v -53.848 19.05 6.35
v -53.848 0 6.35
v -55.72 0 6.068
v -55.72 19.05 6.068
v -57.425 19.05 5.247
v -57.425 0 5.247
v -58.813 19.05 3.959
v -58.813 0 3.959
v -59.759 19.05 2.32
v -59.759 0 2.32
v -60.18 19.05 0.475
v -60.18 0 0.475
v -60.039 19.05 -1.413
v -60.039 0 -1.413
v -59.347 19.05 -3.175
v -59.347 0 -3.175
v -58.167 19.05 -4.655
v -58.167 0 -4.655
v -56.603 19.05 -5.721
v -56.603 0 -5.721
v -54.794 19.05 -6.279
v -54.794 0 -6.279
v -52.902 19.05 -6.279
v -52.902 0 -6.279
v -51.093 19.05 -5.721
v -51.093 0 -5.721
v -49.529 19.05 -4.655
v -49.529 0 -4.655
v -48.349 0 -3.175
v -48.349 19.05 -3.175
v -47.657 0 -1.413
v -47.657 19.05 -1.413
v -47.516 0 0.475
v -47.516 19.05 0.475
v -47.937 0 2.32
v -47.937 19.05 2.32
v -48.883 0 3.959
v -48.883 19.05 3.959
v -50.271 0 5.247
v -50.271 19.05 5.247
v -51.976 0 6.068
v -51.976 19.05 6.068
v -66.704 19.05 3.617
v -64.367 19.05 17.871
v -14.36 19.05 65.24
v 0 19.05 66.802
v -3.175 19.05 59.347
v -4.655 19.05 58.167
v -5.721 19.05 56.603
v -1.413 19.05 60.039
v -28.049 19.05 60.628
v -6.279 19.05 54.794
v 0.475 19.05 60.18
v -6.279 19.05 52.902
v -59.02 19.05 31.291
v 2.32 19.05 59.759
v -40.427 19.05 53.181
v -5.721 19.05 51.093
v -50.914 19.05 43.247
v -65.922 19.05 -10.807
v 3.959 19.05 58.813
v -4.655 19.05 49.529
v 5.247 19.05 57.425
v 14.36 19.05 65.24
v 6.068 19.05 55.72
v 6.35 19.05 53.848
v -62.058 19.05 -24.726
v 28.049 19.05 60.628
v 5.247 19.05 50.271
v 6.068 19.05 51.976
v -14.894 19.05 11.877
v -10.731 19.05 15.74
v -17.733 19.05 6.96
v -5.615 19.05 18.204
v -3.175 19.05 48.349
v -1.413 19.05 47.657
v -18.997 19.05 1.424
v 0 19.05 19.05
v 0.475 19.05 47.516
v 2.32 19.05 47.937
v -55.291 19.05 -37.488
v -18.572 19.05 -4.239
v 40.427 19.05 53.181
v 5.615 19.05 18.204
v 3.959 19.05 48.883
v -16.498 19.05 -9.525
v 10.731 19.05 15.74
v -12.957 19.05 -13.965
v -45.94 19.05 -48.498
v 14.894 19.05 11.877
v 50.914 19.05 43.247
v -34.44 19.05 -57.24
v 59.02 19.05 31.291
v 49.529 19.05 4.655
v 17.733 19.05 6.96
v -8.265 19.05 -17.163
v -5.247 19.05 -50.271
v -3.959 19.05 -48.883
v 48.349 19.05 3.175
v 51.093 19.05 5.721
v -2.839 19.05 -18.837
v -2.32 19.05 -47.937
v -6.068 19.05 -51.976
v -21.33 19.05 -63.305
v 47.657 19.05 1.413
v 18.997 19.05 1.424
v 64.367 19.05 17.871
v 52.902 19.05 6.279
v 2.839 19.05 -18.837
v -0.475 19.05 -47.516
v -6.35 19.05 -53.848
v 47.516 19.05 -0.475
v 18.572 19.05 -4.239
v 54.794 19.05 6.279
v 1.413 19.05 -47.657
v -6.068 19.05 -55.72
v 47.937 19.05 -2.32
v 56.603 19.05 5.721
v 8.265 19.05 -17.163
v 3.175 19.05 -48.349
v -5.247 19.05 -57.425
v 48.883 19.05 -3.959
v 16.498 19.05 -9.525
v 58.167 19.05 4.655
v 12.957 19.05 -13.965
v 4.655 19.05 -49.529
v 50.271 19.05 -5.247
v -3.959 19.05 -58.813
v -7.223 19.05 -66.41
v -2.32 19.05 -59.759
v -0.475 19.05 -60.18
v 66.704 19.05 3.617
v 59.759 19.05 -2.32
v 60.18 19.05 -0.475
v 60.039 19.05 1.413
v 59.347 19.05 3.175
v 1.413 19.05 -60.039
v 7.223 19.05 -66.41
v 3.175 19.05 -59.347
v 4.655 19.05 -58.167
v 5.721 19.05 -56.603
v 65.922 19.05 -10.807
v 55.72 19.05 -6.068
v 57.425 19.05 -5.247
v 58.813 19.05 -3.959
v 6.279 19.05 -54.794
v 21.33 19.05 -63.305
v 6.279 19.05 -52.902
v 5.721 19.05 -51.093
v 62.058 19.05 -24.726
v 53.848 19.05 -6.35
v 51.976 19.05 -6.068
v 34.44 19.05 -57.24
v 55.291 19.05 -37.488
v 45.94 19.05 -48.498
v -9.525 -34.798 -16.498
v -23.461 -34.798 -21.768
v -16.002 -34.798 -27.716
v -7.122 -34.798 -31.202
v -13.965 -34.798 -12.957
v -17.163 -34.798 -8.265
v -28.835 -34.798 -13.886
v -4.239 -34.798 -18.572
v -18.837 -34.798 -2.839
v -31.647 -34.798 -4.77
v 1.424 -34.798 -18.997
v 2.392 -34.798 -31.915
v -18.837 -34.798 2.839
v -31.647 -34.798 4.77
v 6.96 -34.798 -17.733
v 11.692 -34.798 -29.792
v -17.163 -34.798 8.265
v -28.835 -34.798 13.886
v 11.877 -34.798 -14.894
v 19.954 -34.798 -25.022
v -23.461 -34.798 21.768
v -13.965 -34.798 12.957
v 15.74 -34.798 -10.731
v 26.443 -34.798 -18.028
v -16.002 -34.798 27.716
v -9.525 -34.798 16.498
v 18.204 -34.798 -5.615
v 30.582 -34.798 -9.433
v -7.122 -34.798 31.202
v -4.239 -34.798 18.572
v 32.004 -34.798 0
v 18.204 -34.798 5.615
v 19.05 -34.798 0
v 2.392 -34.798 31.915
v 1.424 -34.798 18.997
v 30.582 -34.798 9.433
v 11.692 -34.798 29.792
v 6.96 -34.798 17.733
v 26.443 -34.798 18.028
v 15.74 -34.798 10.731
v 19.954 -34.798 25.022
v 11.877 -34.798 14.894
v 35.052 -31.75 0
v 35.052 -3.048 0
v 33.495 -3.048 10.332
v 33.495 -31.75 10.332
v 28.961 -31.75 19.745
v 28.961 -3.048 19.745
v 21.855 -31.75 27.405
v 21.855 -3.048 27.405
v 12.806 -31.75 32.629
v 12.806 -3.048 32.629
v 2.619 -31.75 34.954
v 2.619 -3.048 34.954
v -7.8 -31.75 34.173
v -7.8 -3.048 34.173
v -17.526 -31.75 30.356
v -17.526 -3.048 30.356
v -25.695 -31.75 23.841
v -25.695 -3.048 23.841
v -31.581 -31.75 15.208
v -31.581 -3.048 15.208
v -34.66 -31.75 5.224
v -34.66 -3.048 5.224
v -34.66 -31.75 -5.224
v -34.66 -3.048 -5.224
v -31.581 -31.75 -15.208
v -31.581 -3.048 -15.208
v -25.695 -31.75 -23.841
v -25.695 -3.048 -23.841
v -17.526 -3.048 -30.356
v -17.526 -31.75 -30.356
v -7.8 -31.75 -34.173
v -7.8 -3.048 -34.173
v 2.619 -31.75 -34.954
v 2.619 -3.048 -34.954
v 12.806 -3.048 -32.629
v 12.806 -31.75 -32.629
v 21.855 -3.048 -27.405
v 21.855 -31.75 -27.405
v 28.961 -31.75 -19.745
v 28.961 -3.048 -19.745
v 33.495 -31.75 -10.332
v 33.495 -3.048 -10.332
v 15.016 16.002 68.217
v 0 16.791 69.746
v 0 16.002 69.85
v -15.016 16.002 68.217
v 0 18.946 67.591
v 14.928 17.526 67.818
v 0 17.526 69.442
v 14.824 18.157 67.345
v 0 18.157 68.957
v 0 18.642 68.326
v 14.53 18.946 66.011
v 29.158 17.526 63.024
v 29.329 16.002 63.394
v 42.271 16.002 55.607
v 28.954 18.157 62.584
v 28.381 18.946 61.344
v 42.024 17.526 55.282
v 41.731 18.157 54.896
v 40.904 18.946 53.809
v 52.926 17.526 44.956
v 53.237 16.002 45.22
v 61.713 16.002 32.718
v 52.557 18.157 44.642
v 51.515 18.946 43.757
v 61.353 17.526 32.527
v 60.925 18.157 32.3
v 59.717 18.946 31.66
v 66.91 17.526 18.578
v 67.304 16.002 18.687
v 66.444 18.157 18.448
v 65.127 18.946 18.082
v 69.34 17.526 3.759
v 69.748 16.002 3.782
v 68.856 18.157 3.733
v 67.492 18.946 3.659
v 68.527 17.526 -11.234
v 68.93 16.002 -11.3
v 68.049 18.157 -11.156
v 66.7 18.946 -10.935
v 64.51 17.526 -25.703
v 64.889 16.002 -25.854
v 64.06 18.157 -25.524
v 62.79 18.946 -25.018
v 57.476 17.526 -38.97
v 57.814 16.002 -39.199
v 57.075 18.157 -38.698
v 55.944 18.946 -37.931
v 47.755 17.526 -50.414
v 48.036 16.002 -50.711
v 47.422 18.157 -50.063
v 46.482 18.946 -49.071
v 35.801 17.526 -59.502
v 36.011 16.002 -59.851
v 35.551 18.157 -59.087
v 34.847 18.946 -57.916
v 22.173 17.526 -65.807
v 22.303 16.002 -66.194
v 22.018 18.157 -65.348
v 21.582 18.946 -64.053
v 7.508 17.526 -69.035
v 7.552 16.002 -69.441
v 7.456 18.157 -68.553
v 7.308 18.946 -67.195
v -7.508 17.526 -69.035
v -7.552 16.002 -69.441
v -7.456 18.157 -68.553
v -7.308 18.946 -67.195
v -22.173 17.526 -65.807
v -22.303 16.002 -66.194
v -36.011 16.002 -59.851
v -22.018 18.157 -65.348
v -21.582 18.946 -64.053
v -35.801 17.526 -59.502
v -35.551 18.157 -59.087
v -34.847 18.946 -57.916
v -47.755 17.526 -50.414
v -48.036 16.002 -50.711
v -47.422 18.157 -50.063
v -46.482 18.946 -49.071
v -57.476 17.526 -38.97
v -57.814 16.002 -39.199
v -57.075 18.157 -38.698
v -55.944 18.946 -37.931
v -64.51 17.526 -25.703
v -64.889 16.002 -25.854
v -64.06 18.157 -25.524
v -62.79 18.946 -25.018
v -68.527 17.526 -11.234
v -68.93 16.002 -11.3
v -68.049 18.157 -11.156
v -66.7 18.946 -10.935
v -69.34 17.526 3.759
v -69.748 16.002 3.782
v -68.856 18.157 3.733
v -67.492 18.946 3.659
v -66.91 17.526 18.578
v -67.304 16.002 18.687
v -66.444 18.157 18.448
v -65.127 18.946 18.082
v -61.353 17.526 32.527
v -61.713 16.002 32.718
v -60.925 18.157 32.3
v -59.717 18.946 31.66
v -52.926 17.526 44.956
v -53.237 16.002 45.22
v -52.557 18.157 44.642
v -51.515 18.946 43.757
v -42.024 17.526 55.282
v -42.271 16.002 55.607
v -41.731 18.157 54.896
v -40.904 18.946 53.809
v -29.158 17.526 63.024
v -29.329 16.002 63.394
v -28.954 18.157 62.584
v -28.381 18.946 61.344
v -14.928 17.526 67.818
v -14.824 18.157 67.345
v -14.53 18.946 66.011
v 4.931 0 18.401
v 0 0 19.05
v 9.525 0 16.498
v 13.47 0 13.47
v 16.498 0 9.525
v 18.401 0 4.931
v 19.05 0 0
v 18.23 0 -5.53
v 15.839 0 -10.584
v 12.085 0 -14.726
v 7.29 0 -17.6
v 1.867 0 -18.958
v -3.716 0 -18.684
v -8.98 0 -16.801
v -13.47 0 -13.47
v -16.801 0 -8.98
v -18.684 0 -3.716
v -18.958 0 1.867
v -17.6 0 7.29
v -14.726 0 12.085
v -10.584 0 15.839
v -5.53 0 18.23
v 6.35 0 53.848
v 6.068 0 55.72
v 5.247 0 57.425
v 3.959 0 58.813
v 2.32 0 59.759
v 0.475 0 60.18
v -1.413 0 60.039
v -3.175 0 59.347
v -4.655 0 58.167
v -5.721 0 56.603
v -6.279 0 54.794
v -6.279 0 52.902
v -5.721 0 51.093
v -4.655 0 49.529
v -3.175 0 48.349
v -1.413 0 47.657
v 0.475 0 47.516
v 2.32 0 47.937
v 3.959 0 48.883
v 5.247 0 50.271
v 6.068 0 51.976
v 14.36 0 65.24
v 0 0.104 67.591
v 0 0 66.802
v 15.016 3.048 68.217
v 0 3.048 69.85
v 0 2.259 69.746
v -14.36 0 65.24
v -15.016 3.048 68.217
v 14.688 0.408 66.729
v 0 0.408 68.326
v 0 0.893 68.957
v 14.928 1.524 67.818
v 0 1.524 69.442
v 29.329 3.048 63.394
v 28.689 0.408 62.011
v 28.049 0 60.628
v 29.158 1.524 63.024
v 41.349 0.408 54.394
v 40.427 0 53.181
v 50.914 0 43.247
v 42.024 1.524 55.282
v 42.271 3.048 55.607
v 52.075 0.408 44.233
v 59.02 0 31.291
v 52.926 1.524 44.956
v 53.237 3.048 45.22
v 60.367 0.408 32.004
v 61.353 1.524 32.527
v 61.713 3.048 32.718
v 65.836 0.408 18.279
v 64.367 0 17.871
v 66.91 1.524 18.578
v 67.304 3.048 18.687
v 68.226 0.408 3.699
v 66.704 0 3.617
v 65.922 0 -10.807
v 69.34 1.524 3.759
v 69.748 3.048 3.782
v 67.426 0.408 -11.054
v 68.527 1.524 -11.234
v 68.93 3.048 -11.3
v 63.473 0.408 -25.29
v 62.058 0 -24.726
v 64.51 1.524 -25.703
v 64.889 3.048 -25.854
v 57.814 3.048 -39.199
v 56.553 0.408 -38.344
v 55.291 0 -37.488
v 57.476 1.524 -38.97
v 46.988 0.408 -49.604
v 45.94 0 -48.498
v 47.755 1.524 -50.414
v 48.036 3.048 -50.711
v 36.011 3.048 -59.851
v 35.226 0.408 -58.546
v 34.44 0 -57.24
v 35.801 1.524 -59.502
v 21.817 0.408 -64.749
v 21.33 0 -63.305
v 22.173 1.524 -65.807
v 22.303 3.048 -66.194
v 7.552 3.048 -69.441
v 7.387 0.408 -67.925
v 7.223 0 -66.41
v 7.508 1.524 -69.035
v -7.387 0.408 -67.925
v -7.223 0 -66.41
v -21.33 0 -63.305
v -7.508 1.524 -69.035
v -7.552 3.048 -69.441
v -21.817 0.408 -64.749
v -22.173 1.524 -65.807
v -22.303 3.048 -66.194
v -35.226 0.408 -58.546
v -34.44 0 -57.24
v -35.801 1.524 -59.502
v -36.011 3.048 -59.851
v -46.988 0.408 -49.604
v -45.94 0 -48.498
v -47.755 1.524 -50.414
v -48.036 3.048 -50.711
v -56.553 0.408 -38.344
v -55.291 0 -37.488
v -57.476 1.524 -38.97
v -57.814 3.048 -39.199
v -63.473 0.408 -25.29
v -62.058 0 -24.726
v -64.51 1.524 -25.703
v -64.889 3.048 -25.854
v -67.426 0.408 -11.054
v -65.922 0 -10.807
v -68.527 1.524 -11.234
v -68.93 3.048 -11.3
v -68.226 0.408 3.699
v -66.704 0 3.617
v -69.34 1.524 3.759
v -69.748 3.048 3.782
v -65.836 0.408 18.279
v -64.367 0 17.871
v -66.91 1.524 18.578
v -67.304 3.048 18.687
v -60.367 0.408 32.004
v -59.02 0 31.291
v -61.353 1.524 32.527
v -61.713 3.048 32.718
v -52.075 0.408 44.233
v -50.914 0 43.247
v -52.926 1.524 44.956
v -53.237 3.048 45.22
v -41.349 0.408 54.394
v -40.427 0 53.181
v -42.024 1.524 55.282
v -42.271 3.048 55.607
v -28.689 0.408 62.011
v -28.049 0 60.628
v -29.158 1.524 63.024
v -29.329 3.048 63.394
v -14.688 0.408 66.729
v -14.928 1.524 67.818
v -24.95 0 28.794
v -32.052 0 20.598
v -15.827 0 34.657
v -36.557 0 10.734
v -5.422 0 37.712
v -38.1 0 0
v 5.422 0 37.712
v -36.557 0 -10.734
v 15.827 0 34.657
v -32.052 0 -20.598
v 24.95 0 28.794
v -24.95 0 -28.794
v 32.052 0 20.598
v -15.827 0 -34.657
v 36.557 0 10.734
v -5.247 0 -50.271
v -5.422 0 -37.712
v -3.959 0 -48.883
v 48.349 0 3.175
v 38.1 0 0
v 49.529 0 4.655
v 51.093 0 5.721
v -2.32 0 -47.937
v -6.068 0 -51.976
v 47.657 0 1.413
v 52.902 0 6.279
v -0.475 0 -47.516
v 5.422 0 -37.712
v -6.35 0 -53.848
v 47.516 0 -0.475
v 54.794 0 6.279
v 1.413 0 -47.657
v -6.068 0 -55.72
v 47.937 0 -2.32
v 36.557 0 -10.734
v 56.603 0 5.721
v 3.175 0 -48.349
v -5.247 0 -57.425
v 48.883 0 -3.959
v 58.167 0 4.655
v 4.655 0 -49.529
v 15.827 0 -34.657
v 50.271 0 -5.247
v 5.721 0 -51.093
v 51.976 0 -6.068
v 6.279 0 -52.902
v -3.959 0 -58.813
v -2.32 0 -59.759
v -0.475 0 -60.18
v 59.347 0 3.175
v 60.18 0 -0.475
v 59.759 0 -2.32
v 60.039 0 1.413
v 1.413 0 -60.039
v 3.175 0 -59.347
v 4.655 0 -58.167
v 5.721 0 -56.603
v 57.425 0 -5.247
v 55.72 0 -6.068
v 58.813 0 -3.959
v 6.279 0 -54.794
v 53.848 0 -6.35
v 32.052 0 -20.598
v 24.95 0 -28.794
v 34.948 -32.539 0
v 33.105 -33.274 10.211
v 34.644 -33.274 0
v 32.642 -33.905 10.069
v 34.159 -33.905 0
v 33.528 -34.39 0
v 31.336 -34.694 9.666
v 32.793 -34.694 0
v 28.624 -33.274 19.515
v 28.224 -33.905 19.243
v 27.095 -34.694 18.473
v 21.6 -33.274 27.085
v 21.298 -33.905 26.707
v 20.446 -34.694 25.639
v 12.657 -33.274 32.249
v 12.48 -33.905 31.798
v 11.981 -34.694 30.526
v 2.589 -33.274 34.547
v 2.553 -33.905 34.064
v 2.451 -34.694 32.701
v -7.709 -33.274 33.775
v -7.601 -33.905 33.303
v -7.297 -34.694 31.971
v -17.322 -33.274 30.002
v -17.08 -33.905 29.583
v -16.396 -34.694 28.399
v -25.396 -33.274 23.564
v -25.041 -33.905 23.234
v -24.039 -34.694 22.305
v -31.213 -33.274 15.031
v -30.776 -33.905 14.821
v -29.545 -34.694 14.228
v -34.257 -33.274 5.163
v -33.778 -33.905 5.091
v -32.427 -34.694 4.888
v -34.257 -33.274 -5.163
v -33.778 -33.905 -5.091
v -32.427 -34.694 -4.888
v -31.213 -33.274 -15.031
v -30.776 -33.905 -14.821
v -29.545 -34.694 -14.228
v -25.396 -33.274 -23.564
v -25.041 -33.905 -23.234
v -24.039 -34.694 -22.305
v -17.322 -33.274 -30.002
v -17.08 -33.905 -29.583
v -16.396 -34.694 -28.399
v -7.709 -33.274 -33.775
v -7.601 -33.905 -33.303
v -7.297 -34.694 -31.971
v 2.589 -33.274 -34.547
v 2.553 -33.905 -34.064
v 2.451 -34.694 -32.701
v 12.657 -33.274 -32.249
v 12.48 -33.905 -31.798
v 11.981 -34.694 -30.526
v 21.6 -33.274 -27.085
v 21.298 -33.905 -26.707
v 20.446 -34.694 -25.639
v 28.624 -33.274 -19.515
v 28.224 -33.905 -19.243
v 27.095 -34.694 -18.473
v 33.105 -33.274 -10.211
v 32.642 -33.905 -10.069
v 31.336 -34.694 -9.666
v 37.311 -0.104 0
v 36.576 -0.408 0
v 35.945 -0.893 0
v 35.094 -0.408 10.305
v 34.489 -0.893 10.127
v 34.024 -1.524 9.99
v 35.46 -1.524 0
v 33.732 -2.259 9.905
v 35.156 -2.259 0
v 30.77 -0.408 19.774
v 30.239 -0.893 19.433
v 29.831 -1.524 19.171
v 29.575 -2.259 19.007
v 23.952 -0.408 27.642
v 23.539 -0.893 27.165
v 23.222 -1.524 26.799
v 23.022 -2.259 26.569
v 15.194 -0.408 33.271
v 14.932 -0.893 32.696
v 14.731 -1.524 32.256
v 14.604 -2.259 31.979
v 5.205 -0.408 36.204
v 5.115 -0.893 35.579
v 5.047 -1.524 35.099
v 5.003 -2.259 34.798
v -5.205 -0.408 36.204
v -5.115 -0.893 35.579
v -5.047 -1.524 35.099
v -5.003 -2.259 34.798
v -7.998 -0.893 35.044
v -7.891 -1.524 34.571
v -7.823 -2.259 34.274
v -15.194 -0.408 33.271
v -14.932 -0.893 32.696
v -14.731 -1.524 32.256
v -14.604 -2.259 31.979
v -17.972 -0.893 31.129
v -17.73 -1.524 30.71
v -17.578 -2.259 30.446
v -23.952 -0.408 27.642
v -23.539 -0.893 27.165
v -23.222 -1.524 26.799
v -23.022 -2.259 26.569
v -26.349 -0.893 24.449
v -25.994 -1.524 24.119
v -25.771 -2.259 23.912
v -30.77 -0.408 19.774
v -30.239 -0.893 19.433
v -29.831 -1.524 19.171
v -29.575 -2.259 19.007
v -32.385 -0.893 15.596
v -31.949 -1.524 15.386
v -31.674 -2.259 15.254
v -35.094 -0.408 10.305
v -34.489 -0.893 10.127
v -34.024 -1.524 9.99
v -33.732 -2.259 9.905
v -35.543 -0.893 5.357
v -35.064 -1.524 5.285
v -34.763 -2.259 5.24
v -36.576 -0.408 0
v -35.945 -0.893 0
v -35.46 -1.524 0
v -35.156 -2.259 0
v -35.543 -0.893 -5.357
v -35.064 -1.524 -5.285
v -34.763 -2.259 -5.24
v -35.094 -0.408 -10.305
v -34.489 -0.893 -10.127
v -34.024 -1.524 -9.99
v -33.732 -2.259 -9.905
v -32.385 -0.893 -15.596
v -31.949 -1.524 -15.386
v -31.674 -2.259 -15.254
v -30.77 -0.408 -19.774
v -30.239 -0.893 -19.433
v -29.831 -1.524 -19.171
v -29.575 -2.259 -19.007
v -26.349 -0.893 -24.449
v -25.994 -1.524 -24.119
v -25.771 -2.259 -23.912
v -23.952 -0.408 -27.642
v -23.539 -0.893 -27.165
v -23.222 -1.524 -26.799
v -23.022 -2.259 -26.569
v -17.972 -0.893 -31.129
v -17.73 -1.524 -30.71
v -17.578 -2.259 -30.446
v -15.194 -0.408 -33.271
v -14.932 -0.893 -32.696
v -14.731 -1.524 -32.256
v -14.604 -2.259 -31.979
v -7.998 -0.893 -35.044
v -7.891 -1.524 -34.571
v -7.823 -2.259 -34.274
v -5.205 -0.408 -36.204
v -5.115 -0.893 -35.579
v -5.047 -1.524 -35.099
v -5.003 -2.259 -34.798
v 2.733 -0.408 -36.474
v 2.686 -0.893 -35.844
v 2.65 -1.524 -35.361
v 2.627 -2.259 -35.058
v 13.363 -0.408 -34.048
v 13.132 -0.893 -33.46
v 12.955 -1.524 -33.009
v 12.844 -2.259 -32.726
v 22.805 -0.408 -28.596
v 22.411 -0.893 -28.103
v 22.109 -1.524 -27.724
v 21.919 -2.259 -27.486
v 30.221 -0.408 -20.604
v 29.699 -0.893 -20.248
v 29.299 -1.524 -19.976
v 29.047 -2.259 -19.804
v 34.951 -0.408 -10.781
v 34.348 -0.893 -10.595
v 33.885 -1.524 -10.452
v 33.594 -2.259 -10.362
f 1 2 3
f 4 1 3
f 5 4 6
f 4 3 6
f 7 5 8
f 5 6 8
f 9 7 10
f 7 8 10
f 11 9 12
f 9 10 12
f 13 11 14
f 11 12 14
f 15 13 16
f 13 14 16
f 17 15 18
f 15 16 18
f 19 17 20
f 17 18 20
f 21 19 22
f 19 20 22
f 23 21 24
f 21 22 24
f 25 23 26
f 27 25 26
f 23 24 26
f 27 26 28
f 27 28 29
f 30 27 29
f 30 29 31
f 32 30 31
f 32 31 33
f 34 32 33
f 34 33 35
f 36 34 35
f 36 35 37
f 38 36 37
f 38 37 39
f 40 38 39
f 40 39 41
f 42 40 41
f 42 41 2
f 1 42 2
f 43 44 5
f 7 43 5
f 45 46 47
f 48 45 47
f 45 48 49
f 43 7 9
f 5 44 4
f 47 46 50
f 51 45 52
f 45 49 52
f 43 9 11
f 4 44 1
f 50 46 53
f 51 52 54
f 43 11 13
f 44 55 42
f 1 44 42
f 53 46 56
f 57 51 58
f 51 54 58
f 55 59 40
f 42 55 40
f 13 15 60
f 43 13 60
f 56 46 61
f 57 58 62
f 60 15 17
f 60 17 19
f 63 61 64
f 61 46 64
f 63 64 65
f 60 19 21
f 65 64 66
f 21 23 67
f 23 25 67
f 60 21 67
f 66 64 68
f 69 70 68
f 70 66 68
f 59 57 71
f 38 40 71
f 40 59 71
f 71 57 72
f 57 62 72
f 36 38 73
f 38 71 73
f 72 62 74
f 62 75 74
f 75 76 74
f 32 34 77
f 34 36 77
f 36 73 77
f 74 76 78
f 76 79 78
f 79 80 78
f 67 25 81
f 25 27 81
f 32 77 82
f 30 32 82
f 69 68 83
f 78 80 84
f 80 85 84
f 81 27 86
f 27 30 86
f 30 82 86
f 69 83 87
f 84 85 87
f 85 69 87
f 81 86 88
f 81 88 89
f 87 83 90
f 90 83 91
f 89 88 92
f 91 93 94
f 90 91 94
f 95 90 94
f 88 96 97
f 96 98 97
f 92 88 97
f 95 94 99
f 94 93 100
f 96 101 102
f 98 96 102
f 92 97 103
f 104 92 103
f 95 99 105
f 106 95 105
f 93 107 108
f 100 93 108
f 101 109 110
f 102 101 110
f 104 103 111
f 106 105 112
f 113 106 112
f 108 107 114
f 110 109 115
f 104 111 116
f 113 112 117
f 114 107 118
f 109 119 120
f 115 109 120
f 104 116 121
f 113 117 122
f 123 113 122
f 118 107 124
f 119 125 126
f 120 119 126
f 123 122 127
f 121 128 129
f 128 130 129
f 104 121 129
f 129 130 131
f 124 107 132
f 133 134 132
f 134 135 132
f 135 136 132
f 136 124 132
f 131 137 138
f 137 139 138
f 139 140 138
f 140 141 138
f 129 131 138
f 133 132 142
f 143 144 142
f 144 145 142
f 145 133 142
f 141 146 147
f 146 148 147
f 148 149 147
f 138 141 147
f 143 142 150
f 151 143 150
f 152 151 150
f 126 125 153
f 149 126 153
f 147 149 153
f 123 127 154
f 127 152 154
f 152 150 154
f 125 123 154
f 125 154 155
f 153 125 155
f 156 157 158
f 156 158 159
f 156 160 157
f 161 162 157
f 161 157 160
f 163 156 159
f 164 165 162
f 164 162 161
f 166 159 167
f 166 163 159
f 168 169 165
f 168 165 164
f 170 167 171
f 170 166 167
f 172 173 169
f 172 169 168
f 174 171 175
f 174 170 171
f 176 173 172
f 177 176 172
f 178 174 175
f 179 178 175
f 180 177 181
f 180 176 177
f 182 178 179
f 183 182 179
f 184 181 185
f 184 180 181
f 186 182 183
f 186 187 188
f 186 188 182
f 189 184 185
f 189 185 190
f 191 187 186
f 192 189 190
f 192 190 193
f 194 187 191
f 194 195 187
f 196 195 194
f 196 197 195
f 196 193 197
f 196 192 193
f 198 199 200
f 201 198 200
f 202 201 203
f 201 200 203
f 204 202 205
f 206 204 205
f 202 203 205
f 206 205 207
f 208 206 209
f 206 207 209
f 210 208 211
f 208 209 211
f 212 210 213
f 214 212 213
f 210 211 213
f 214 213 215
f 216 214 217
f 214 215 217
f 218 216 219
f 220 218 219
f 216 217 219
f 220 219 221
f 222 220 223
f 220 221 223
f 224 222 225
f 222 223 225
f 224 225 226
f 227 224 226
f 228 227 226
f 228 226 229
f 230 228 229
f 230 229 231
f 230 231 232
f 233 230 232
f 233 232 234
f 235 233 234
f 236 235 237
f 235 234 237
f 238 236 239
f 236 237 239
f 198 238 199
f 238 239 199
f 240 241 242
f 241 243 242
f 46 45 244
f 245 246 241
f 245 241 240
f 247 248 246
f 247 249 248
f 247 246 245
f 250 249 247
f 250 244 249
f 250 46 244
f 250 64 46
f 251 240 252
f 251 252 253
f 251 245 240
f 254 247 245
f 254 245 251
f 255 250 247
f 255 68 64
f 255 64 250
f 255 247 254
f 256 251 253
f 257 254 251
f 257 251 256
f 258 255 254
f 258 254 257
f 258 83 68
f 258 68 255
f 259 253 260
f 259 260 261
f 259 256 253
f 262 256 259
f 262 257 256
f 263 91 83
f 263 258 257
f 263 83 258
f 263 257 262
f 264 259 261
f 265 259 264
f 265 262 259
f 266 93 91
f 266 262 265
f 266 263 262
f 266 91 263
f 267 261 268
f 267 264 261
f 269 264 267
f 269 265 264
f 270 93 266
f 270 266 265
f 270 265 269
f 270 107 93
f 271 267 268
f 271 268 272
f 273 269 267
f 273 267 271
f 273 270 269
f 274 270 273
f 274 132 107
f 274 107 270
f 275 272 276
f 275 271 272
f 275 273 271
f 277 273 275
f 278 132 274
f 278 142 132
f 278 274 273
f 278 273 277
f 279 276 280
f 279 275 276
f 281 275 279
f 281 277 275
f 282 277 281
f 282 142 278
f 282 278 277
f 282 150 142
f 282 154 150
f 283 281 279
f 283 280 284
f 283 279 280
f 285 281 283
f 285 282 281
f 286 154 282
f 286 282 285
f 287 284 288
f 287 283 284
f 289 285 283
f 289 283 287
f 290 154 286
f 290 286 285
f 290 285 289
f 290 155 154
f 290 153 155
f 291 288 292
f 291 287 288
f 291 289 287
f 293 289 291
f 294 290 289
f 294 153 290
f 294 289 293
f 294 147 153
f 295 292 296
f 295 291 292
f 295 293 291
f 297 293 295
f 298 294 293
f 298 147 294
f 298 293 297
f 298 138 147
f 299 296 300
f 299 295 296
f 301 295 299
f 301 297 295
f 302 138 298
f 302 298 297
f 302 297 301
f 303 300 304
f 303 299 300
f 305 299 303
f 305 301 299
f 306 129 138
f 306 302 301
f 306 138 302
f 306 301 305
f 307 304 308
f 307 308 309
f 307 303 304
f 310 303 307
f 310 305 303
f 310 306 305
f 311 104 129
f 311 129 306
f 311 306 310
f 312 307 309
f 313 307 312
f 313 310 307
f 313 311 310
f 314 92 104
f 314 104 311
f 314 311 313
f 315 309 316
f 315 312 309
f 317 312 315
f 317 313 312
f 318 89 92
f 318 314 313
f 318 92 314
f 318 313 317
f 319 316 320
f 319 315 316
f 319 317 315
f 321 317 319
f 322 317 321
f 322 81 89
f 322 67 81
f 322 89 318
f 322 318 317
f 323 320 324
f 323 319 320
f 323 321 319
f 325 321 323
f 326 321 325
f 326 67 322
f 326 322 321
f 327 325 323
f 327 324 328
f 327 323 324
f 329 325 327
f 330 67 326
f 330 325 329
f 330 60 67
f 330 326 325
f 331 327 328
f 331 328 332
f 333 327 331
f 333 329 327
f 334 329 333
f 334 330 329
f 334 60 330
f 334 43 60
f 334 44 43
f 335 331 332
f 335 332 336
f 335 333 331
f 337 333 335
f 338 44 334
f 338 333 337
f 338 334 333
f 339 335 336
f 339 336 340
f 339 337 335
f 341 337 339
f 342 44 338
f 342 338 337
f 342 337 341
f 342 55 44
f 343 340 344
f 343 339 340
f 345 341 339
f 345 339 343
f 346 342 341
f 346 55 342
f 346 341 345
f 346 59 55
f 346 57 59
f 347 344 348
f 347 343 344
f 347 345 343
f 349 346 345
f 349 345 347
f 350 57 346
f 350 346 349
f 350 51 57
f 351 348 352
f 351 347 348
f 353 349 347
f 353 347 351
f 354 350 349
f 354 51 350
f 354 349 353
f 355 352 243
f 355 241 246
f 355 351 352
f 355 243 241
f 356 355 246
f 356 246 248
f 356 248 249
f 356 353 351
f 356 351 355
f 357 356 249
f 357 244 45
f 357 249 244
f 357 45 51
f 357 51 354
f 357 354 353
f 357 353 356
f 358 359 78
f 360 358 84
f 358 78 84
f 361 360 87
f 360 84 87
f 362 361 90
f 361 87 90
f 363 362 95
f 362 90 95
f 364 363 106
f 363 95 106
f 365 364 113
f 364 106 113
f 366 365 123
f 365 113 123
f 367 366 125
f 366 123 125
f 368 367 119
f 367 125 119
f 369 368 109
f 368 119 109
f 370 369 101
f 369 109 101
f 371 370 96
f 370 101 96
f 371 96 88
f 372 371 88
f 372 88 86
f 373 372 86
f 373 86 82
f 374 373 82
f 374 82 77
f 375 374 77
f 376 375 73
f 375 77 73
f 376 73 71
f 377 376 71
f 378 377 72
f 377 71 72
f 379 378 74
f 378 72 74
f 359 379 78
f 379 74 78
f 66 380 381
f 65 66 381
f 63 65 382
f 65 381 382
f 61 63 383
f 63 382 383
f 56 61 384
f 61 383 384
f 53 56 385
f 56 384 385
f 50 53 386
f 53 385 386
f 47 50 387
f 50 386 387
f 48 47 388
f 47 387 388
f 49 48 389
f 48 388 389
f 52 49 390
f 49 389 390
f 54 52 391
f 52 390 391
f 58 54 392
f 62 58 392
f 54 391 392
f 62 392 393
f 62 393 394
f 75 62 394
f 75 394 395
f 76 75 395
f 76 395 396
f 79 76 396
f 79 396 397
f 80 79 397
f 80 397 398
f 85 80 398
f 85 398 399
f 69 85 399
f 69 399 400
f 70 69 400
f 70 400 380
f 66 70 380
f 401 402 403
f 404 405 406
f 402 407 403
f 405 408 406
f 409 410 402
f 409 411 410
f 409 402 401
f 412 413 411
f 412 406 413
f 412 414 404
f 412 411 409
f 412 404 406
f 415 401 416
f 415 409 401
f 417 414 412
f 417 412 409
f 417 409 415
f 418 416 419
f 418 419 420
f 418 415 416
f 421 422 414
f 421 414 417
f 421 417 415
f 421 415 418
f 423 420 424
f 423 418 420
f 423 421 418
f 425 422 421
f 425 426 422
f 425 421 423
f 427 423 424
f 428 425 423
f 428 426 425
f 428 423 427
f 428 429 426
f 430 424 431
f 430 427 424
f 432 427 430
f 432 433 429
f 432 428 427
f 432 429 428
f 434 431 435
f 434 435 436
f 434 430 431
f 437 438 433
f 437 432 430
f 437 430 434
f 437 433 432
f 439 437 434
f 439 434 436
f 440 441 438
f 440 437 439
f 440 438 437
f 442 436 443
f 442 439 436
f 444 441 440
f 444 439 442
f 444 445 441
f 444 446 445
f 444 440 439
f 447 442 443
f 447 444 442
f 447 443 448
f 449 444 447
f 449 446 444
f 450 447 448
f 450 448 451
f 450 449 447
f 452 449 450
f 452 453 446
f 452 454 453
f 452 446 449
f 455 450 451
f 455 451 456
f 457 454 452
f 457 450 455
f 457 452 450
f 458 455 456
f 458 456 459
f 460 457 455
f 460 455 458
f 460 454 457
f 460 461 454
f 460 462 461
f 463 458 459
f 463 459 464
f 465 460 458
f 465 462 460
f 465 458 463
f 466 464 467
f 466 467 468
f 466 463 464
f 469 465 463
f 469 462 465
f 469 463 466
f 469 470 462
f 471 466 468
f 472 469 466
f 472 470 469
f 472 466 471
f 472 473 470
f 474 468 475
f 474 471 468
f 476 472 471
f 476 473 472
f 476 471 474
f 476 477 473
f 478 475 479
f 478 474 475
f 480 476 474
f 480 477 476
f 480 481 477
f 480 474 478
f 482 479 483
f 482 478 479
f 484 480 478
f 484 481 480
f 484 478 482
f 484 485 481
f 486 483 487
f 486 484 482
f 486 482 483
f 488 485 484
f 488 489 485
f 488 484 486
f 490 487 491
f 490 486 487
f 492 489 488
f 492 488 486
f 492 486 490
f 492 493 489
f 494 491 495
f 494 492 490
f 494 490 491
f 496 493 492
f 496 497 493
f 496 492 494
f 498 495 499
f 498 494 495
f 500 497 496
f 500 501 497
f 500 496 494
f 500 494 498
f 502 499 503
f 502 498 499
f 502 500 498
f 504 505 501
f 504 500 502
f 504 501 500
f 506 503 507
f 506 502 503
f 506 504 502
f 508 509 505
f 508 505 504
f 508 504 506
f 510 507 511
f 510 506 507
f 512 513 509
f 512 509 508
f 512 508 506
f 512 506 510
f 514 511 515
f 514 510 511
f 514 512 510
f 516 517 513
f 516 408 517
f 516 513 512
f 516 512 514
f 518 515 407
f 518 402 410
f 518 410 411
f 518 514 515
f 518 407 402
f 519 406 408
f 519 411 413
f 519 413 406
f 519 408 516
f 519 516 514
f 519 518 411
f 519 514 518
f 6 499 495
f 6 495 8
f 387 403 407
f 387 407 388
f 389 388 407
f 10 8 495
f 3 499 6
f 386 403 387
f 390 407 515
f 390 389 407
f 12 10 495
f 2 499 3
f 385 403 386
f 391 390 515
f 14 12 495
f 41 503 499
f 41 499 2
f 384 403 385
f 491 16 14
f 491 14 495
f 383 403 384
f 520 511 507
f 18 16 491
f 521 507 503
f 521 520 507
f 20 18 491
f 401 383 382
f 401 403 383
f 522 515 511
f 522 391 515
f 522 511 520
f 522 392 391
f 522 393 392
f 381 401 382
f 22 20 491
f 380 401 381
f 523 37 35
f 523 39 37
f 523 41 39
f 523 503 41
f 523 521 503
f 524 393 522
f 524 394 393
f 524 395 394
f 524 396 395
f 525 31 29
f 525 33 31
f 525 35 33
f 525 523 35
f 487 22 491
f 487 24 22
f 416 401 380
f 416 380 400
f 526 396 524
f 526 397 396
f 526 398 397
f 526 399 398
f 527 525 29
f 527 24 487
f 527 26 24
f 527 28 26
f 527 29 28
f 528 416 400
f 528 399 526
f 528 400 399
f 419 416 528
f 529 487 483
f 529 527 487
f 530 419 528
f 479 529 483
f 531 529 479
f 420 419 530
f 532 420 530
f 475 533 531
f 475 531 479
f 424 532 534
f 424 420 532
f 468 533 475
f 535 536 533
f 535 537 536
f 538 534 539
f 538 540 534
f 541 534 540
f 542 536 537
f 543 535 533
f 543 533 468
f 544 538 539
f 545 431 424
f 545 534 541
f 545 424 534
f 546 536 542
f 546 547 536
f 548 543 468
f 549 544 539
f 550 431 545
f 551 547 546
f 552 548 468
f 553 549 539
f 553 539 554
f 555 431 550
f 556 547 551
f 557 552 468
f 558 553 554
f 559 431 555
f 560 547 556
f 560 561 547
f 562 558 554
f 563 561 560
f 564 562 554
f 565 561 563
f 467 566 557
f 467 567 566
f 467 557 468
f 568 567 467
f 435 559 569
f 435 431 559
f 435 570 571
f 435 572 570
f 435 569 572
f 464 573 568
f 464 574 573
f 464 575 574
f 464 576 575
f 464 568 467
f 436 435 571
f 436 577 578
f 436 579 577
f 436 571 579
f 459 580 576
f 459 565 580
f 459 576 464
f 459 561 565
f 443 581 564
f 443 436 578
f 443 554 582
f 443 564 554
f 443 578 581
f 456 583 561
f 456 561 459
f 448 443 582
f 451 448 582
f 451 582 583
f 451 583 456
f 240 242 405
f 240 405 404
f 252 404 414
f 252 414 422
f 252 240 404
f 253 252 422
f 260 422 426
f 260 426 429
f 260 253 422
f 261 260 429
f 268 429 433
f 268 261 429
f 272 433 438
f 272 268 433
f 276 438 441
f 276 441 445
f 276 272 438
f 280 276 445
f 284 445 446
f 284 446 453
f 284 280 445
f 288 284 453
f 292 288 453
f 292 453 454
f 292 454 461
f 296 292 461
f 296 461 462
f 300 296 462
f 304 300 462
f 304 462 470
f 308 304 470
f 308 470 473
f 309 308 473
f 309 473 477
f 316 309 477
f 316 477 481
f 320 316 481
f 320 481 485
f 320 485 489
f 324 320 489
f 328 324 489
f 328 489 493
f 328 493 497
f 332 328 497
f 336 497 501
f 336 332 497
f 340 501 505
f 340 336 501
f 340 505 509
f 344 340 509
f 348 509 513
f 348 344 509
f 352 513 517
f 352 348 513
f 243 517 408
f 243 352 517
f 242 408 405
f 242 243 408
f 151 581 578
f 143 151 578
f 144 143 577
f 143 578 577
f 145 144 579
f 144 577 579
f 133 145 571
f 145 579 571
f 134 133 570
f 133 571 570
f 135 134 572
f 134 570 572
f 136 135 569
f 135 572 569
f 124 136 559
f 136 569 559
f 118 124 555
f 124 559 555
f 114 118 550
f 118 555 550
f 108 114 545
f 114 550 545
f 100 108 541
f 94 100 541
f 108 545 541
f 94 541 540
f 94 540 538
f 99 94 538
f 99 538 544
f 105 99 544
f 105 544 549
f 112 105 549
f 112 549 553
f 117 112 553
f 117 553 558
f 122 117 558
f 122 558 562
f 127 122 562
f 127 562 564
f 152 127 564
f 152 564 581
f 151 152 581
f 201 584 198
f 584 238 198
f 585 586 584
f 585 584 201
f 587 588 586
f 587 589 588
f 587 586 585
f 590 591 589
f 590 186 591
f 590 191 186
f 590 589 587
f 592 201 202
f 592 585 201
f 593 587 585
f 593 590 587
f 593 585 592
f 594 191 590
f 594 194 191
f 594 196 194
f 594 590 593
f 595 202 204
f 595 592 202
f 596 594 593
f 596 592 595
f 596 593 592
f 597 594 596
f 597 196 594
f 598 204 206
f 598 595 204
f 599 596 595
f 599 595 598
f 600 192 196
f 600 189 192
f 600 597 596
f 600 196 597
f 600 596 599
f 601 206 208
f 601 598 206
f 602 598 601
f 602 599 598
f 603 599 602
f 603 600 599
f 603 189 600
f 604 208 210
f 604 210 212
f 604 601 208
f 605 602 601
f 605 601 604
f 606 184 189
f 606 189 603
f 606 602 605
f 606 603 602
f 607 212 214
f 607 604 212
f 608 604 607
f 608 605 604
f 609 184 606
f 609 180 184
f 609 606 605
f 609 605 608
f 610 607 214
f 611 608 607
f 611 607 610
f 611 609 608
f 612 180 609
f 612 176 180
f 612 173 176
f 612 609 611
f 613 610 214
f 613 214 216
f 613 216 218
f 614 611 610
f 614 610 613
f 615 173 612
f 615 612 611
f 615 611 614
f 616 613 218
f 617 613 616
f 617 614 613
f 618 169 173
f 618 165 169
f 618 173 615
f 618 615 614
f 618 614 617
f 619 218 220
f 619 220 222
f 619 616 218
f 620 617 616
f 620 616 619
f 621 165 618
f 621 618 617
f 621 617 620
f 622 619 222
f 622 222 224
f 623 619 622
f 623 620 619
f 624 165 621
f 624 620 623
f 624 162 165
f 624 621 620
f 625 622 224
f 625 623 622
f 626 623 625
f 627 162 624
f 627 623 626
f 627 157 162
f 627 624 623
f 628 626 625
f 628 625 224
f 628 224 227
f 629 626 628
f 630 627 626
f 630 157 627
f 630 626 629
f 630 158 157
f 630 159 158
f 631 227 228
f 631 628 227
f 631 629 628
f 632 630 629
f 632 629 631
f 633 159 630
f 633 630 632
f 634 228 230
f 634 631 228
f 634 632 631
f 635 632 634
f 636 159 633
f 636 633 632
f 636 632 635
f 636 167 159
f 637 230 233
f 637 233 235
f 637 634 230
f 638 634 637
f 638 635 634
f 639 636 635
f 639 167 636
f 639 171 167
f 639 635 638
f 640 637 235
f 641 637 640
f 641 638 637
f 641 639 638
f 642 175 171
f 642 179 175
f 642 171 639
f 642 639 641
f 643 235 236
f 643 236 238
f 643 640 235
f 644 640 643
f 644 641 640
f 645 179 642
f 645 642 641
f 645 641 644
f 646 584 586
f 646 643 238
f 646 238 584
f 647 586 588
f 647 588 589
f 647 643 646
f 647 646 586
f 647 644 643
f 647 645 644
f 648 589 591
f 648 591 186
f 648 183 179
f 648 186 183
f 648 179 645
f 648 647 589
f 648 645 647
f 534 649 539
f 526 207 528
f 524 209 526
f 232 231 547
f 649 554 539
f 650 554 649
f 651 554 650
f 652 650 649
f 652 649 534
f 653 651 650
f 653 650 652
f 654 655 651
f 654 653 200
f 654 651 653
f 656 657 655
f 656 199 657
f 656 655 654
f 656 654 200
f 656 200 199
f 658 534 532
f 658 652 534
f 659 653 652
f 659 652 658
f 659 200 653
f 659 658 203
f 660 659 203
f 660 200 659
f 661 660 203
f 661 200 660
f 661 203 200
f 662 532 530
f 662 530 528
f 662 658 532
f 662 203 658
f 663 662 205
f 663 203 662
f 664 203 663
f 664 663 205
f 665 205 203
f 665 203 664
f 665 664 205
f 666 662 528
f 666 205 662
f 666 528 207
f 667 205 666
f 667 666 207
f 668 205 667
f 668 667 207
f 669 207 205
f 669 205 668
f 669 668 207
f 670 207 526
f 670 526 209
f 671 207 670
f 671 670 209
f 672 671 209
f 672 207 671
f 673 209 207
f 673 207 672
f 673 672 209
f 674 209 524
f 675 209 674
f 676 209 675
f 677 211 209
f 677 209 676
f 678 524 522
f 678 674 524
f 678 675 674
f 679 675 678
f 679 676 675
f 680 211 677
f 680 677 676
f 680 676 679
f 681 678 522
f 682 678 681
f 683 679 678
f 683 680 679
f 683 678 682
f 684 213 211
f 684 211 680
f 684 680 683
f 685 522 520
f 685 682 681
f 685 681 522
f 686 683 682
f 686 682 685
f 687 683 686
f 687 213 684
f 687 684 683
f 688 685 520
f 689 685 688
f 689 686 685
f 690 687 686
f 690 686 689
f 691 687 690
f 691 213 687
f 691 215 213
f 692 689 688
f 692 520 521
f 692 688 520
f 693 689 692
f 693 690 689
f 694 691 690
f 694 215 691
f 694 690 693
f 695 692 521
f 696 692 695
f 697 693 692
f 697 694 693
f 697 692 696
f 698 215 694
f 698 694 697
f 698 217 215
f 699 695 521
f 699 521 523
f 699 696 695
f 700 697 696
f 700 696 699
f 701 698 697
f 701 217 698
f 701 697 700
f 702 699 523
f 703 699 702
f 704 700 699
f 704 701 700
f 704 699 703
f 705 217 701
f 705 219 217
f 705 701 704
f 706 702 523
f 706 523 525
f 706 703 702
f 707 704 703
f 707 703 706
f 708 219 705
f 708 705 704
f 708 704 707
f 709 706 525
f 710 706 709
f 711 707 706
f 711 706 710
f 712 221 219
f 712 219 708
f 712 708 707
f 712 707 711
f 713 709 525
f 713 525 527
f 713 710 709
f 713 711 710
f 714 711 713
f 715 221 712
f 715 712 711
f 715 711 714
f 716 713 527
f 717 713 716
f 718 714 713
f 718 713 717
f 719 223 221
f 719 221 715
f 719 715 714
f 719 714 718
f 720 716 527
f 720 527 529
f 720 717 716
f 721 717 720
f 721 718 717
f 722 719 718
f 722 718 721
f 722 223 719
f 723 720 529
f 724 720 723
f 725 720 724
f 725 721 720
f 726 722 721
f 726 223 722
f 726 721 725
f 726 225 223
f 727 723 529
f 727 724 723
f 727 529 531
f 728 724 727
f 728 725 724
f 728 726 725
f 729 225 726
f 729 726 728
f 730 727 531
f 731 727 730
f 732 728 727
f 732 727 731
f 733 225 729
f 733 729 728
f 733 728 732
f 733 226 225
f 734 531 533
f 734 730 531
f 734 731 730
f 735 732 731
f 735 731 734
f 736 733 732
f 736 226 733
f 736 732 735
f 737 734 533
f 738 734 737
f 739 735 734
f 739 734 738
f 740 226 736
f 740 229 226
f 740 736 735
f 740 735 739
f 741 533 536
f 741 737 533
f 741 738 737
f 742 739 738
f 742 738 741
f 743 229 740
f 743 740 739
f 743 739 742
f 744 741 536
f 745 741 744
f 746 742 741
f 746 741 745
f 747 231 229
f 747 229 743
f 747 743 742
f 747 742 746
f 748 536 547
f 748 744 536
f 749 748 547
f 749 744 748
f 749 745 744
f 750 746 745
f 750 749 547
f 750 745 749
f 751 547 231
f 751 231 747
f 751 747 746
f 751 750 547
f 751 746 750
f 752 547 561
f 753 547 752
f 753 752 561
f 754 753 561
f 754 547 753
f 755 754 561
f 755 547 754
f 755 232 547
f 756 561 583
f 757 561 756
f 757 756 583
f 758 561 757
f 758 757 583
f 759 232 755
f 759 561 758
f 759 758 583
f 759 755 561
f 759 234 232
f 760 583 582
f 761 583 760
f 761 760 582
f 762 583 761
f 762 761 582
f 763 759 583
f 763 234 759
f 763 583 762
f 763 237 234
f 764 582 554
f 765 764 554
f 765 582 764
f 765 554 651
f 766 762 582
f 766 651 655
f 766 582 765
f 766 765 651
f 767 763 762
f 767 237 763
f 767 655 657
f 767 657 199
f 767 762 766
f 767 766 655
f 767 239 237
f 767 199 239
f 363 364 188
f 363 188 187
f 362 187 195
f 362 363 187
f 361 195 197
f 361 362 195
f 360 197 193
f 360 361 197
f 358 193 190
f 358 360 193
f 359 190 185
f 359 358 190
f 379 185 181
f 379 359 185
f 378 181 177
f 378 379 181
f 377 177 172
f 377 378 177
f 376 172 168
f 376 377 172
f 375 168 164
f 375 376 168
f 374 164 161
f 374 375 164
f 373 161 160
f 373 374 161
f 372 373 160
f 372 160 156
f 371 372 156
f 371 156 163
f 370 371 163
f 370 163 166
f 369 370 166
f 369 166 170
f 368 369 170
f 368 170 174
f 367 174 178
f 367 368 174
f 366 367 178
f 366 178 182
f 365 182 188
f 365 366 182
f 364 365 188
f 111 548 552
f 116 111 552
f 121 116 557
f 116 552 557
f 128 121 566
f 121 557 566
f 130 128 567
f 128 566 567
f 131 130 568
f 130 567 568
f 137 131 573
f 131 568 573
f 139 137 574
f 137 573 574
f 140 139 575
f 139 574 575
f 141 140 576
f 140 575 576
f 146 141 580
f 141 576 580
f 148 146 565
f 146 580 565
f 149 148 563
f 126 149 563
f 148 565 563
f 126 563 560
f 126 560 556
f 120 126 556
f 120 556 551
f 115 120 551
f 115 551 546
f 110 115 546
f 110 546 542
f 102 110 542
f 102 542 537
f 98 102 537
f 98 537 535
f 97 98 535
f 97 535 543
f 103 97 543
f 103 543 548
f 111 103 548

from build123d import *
from build123d import SkipClean  # not in build123d's __all__

# Parameters (mm, degrees)
F0_W            = 19.05
F0_H            = 50.8
F2_R            = 35.052
F2_R_2          = 19.05
F3_DEPTH        = 34.798
F2_R_3          = 6.35
F4_DEPTH        = 19.051
F4_COPIES_COUNT = 4
F5_R            = 3.048
F6_R            = 3.048


# Not quite as in the source:
# - after a boolean that leaves OpenCascade's solid faulty, fix() repairs it
# - a pattern or mirror of a feature is missing from the dataset's text; its kind, count and spacing are read off the source's solid


with BuildPart() as f1:
    # F0 (on Right) → F1 (revolve)
    with BuildSketch(Plane.YZ):
        with Locations((9.525, 44.45)):
            Rectangle(F0_W, F0_H)
    revolve(axis=Axis((0, 24.8311646283, 0), (0, 1, 0)))

    # F2 (on face) → F3 (join)
    with BuildSketch(Plane.XZ):
        Circle(F2_R)
        Circle(F2_R_2, mode=Mode.SUBTRACT)
    with SkipClean():  # cleaning this boolean's faces spoils the solid; the shape is the same uncleaned
        extrude(amount=F3_DEPTH)

    # F2 (on face) → F4 (cut, through all)
    with BuildSketch(Plane.XZ):
        with Locations((0, 53.848)):
            Circle(F2_R_3)
    f4 = extrude(amount=-F4_DEPTH, mode=Mode.SUBTRACT)

    add(f1.part.fix(), mode=Mode.REPLACE)

    # F4_copies: F4 ×4 about axis
    f4_copies_axis = Axis((0, 0, 0), (0, 1, 0))
    for i in range(1, F4_COPIES_COUNT):
        add(f4.rotate(f4_copies_axis, i * 360 / F4_COPIES_COUNT), clean=False, mode=Mode.SUBTRACT)

    # F5
    f5_edges = [f1.edges().sort_by_distance(p)[0] for p in [
        (0, 0, -69.85),
        (0, 19.05, -69.85),
    ]]
    fillet(f5_edges, radius=F5_R)

    # F6
    f6_edges = [f1.edges().sort_by_distance(p)[0] for p in [
        (35.052, -17.399, 0),
        (-35.052, -34.798, 0),
        (-35.052, 0, 0),
    ]]
    fillet(f6_edges, radius=F6_R)


solid = f1.part
